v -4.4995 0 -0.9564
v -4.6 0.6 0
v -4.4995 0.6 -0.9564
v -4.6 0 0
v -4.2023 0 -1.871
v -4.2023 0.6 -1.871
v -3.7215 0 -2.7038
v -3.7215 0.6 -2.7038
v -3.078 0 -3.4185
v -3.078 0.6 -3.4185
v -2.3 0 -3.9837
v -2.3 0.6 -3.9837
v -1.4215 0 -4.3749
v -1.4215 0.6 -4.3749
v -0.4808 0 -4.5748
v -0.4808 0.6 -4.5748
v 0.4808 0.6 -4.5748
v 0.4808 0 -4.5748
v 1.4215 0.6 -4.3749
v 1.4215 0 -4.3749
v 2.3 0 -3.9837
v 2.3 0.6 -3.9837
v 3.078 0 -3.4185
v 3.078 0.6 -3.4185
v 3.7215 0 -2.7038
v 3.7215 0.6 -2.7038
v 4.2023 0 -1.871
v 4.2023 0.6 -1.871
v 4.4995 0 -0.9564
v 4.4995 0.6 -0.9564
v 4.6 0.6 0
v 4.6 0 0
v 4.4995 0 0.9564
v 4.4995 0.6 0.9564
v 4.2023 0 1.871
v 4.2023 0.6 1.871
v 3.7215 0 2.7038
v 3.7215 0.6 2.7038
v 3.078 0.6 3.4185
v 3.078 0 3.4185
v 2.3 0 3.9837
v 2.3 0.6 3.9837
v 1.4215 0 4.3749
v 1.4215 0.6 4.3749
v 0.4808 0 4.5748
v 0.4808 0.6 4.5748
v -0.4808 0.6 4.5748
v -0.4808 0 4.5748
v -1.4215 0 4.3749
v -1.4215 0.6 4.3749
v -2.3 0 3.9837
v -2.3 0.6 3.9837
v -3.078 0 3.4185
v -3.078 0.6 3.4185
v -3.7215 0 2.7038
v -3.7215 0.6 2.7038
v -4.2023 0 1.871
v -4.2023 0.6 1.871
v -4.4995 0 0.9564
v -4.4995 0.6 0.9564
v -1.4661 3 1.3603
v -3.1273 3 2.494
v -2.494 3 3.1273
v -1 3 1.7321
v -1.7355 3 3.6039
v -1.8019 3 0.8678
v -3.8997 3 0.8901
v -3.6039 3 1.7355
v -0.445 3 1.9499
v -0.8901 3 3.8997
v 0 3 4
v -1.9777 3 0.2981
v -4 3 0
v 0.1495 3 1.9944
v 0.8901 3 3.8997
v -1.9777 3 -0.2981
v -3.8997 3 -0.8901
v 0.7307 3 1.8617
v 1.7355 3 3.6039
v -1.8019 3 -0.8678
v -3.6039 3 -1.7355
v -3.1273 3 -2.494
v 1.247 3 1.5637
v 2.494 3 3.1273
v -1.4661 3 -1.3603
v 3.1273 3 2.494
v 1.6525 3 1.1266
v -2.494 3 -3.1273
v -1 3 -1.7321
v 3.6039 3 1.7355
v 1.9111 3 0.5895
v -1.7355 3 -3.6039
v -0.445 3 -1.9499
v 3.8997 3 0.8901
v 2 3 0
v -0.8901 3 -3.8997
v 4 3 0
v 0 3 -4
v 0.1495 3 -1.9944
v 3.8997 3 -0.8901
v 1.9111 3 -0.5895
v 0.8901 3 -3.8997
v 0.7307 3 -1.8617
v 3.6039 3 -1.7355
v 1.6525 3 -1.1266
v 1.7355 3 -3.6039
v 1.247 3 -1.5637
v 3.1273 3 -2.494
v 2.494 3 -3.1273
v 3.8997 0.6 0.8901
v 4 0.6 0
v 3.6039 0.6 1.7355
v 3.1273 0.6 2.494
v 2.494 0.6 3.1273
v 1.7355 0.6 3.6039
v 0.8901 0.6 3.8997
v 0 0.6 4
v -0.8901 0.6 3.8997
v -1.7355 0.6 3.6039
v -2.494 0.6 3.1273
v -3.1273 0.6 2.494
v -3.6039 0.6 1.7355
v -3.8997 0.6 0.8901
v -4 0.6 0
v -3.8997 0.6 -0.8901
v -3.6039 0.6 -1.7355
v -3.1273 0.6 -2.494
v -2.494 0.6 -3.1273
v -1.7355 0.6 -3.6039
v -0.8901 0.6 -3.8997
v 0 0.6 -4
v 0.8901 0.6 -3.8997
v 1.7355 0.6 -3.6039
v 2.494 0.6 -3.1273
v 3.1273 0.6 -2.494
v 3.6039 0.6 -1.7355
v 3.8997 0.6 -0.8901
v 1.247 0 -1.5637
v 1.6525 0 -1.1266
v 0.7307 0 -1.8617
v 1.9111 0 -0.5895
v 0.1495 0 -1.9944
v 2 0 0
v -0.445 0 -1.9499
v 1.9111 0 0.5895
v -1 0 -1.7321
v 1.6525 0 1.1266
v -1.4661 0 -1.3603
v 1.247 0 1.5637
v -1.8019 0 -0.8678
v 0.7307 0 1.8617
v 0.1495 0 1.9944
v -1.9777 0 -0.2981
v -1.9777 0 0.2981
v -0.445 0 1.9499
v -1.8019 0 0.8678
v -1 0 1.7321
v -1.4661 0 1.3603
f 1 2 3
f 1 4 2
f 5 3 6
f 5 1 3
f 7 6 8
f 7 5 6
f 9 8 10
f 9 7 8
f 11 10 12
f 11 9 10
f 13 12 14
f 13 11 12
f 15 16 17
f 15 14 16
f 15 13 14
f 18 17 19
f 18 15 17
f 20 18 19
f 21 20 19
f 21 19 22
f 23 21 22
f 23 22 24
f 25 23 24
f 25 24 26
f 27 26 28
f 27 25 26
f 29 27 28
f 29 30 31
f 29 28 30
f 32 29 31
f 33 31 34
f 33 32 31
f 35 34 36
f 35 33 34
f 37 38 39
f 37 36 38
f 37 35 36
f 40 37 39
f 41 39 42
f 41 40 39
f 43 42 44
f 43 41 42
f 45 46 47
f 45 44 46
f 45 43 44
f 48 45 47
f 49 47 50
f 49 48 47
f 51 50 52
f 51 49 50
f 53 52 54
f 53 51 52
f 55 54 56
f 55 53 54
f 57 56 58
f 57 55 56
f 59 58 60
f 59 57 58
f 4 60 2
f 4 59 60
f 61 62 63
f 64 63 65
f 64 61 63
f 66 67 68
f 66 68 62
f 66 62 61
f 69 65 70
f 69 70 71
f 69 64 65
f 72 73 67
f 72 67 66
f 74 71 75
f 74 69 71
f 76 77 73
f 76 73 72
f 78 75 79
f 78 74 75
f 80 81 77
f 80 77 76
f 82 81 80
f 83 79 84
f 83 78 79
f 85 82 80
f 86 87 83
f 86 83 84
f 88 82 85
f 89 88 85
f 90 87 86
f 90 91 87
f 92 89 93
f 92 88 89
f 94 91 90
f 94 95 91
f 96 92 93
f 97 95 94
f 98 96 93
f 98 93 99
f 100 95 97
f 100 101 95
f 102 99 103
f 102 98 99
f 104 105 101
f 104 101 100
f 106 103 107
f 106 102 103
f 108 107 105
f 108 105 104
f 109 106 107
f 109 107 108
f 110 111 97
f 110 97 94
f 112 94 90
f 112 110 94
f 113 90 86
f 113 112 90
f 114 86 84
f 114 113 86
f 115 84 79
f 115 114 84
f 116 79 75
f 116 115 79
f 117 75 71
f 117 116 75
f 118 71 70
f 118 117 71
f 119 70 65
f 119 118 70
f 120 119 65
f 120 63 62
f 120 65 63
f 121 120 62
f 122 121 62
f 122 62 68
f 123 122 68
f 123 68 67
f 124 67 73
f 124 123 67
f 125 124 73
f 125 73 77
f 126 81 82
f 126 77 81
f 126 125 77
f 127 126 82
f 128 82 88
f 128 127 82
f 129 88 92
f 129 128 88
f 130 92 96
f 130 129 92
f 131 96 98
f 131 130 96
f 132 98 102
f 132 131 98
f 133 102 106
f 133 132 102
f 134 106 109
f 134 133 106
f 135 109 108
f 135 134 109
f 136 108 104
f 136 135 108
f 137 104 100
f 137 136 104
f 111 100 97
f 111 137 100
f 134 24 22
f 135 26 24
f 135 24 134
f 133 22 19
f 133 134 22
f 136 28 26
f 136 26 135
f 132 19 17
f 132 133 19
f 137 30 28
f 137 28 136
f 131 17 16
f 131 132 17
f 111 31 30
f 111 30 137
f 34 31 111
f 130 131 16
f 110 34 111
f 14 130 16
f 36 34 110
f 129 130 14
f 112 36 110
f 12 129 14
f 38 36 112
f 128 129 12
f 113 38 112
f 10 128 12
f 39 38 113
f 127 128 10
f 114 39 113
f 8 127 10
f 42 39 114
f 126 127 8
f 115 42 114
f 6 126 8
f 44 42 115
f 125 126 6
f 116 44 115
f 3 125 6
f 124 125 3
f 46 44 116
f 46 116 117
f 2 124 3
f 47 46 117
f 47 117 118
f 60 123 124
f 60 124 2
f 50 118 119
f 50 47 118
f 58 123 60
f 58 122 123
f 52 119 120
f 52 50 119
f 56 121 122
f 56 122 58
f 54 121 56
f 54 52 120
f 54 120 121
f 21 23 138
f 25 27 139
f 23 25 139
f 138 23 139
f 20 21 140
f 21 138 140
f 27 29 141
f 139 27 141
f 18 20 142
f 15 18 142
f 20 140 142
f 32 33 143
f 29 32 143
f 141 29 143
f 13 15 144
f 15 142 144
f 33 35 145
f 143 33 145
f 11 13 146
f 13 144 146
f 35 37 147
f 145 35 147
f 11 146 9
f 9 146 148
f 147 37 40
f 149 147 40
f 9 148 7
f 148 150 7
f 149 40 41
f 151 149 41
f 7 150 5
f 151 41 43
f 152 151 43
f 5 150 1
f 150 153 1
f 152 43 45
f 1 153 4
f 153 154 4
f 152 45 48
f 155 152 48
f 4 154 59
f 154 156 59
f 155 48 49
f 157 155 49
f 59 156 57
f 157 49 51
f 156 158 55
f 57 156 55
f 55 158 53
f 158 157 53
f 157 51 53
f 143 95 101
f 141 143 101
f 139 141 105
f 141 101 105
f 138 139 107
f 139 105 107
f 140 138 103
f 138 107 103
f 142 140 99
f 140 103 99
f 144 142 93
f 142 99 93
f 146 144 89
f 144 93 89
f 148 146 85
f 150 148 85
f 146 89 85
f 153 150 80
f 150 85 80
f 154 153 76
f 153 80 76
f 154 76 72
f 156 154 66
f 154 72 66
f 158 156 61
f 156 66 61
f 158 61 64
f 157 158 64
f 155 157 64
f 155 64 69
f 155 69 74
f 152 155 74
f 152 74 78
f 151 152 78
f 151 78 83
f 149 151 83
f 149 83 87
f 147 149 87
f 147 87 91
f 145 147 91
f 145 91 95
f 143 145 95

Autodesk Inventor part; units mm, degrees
ref_plane "YZ Plane" through (0, 0, 0) normal (1, 0, 0) x (0, 1, 0)
ref_plane "XZ Plane" through (0, 0, 0) normal (0, 1, 0) x (-1, 0, 0)
ref_plane "XY Plane" through (0, 0, 0) normal (0, 0, 1) x (1, 0, 0)
sketch "Sketch1" plane through (0, 0, 0) normal (0, 1, 0) x (-1, 0, 0)
  circle A0 centre (0, 0) radius 4.6
  dimension "d0" = 9.2
extrude "Extrusion1" add sketch "Sketch1" along normal blind 0.6
sketch "Sketch2" plane through (0, 0.6, 0) normal (0, 1, 0) x (1, 0, 0)
  circle A0 centre (0, 0) radius 4
  dimension "d3" = 8
extrude "Extrusion2" add sketch "Sketch2" along normal blind 2.4
sketch "Sketch3" plane through (0, 3, 0) normal (0, 1, 0) x (1, 0, 0)
  circle A0 centre (0, 0) radius 2
  dimension "d6" = 4
extrude "Extrusion3" cut sketch "Sketch3" against normal through all
equation "\"d7\" = d6"
properties part number "bearing_8_4_3_flanged"
